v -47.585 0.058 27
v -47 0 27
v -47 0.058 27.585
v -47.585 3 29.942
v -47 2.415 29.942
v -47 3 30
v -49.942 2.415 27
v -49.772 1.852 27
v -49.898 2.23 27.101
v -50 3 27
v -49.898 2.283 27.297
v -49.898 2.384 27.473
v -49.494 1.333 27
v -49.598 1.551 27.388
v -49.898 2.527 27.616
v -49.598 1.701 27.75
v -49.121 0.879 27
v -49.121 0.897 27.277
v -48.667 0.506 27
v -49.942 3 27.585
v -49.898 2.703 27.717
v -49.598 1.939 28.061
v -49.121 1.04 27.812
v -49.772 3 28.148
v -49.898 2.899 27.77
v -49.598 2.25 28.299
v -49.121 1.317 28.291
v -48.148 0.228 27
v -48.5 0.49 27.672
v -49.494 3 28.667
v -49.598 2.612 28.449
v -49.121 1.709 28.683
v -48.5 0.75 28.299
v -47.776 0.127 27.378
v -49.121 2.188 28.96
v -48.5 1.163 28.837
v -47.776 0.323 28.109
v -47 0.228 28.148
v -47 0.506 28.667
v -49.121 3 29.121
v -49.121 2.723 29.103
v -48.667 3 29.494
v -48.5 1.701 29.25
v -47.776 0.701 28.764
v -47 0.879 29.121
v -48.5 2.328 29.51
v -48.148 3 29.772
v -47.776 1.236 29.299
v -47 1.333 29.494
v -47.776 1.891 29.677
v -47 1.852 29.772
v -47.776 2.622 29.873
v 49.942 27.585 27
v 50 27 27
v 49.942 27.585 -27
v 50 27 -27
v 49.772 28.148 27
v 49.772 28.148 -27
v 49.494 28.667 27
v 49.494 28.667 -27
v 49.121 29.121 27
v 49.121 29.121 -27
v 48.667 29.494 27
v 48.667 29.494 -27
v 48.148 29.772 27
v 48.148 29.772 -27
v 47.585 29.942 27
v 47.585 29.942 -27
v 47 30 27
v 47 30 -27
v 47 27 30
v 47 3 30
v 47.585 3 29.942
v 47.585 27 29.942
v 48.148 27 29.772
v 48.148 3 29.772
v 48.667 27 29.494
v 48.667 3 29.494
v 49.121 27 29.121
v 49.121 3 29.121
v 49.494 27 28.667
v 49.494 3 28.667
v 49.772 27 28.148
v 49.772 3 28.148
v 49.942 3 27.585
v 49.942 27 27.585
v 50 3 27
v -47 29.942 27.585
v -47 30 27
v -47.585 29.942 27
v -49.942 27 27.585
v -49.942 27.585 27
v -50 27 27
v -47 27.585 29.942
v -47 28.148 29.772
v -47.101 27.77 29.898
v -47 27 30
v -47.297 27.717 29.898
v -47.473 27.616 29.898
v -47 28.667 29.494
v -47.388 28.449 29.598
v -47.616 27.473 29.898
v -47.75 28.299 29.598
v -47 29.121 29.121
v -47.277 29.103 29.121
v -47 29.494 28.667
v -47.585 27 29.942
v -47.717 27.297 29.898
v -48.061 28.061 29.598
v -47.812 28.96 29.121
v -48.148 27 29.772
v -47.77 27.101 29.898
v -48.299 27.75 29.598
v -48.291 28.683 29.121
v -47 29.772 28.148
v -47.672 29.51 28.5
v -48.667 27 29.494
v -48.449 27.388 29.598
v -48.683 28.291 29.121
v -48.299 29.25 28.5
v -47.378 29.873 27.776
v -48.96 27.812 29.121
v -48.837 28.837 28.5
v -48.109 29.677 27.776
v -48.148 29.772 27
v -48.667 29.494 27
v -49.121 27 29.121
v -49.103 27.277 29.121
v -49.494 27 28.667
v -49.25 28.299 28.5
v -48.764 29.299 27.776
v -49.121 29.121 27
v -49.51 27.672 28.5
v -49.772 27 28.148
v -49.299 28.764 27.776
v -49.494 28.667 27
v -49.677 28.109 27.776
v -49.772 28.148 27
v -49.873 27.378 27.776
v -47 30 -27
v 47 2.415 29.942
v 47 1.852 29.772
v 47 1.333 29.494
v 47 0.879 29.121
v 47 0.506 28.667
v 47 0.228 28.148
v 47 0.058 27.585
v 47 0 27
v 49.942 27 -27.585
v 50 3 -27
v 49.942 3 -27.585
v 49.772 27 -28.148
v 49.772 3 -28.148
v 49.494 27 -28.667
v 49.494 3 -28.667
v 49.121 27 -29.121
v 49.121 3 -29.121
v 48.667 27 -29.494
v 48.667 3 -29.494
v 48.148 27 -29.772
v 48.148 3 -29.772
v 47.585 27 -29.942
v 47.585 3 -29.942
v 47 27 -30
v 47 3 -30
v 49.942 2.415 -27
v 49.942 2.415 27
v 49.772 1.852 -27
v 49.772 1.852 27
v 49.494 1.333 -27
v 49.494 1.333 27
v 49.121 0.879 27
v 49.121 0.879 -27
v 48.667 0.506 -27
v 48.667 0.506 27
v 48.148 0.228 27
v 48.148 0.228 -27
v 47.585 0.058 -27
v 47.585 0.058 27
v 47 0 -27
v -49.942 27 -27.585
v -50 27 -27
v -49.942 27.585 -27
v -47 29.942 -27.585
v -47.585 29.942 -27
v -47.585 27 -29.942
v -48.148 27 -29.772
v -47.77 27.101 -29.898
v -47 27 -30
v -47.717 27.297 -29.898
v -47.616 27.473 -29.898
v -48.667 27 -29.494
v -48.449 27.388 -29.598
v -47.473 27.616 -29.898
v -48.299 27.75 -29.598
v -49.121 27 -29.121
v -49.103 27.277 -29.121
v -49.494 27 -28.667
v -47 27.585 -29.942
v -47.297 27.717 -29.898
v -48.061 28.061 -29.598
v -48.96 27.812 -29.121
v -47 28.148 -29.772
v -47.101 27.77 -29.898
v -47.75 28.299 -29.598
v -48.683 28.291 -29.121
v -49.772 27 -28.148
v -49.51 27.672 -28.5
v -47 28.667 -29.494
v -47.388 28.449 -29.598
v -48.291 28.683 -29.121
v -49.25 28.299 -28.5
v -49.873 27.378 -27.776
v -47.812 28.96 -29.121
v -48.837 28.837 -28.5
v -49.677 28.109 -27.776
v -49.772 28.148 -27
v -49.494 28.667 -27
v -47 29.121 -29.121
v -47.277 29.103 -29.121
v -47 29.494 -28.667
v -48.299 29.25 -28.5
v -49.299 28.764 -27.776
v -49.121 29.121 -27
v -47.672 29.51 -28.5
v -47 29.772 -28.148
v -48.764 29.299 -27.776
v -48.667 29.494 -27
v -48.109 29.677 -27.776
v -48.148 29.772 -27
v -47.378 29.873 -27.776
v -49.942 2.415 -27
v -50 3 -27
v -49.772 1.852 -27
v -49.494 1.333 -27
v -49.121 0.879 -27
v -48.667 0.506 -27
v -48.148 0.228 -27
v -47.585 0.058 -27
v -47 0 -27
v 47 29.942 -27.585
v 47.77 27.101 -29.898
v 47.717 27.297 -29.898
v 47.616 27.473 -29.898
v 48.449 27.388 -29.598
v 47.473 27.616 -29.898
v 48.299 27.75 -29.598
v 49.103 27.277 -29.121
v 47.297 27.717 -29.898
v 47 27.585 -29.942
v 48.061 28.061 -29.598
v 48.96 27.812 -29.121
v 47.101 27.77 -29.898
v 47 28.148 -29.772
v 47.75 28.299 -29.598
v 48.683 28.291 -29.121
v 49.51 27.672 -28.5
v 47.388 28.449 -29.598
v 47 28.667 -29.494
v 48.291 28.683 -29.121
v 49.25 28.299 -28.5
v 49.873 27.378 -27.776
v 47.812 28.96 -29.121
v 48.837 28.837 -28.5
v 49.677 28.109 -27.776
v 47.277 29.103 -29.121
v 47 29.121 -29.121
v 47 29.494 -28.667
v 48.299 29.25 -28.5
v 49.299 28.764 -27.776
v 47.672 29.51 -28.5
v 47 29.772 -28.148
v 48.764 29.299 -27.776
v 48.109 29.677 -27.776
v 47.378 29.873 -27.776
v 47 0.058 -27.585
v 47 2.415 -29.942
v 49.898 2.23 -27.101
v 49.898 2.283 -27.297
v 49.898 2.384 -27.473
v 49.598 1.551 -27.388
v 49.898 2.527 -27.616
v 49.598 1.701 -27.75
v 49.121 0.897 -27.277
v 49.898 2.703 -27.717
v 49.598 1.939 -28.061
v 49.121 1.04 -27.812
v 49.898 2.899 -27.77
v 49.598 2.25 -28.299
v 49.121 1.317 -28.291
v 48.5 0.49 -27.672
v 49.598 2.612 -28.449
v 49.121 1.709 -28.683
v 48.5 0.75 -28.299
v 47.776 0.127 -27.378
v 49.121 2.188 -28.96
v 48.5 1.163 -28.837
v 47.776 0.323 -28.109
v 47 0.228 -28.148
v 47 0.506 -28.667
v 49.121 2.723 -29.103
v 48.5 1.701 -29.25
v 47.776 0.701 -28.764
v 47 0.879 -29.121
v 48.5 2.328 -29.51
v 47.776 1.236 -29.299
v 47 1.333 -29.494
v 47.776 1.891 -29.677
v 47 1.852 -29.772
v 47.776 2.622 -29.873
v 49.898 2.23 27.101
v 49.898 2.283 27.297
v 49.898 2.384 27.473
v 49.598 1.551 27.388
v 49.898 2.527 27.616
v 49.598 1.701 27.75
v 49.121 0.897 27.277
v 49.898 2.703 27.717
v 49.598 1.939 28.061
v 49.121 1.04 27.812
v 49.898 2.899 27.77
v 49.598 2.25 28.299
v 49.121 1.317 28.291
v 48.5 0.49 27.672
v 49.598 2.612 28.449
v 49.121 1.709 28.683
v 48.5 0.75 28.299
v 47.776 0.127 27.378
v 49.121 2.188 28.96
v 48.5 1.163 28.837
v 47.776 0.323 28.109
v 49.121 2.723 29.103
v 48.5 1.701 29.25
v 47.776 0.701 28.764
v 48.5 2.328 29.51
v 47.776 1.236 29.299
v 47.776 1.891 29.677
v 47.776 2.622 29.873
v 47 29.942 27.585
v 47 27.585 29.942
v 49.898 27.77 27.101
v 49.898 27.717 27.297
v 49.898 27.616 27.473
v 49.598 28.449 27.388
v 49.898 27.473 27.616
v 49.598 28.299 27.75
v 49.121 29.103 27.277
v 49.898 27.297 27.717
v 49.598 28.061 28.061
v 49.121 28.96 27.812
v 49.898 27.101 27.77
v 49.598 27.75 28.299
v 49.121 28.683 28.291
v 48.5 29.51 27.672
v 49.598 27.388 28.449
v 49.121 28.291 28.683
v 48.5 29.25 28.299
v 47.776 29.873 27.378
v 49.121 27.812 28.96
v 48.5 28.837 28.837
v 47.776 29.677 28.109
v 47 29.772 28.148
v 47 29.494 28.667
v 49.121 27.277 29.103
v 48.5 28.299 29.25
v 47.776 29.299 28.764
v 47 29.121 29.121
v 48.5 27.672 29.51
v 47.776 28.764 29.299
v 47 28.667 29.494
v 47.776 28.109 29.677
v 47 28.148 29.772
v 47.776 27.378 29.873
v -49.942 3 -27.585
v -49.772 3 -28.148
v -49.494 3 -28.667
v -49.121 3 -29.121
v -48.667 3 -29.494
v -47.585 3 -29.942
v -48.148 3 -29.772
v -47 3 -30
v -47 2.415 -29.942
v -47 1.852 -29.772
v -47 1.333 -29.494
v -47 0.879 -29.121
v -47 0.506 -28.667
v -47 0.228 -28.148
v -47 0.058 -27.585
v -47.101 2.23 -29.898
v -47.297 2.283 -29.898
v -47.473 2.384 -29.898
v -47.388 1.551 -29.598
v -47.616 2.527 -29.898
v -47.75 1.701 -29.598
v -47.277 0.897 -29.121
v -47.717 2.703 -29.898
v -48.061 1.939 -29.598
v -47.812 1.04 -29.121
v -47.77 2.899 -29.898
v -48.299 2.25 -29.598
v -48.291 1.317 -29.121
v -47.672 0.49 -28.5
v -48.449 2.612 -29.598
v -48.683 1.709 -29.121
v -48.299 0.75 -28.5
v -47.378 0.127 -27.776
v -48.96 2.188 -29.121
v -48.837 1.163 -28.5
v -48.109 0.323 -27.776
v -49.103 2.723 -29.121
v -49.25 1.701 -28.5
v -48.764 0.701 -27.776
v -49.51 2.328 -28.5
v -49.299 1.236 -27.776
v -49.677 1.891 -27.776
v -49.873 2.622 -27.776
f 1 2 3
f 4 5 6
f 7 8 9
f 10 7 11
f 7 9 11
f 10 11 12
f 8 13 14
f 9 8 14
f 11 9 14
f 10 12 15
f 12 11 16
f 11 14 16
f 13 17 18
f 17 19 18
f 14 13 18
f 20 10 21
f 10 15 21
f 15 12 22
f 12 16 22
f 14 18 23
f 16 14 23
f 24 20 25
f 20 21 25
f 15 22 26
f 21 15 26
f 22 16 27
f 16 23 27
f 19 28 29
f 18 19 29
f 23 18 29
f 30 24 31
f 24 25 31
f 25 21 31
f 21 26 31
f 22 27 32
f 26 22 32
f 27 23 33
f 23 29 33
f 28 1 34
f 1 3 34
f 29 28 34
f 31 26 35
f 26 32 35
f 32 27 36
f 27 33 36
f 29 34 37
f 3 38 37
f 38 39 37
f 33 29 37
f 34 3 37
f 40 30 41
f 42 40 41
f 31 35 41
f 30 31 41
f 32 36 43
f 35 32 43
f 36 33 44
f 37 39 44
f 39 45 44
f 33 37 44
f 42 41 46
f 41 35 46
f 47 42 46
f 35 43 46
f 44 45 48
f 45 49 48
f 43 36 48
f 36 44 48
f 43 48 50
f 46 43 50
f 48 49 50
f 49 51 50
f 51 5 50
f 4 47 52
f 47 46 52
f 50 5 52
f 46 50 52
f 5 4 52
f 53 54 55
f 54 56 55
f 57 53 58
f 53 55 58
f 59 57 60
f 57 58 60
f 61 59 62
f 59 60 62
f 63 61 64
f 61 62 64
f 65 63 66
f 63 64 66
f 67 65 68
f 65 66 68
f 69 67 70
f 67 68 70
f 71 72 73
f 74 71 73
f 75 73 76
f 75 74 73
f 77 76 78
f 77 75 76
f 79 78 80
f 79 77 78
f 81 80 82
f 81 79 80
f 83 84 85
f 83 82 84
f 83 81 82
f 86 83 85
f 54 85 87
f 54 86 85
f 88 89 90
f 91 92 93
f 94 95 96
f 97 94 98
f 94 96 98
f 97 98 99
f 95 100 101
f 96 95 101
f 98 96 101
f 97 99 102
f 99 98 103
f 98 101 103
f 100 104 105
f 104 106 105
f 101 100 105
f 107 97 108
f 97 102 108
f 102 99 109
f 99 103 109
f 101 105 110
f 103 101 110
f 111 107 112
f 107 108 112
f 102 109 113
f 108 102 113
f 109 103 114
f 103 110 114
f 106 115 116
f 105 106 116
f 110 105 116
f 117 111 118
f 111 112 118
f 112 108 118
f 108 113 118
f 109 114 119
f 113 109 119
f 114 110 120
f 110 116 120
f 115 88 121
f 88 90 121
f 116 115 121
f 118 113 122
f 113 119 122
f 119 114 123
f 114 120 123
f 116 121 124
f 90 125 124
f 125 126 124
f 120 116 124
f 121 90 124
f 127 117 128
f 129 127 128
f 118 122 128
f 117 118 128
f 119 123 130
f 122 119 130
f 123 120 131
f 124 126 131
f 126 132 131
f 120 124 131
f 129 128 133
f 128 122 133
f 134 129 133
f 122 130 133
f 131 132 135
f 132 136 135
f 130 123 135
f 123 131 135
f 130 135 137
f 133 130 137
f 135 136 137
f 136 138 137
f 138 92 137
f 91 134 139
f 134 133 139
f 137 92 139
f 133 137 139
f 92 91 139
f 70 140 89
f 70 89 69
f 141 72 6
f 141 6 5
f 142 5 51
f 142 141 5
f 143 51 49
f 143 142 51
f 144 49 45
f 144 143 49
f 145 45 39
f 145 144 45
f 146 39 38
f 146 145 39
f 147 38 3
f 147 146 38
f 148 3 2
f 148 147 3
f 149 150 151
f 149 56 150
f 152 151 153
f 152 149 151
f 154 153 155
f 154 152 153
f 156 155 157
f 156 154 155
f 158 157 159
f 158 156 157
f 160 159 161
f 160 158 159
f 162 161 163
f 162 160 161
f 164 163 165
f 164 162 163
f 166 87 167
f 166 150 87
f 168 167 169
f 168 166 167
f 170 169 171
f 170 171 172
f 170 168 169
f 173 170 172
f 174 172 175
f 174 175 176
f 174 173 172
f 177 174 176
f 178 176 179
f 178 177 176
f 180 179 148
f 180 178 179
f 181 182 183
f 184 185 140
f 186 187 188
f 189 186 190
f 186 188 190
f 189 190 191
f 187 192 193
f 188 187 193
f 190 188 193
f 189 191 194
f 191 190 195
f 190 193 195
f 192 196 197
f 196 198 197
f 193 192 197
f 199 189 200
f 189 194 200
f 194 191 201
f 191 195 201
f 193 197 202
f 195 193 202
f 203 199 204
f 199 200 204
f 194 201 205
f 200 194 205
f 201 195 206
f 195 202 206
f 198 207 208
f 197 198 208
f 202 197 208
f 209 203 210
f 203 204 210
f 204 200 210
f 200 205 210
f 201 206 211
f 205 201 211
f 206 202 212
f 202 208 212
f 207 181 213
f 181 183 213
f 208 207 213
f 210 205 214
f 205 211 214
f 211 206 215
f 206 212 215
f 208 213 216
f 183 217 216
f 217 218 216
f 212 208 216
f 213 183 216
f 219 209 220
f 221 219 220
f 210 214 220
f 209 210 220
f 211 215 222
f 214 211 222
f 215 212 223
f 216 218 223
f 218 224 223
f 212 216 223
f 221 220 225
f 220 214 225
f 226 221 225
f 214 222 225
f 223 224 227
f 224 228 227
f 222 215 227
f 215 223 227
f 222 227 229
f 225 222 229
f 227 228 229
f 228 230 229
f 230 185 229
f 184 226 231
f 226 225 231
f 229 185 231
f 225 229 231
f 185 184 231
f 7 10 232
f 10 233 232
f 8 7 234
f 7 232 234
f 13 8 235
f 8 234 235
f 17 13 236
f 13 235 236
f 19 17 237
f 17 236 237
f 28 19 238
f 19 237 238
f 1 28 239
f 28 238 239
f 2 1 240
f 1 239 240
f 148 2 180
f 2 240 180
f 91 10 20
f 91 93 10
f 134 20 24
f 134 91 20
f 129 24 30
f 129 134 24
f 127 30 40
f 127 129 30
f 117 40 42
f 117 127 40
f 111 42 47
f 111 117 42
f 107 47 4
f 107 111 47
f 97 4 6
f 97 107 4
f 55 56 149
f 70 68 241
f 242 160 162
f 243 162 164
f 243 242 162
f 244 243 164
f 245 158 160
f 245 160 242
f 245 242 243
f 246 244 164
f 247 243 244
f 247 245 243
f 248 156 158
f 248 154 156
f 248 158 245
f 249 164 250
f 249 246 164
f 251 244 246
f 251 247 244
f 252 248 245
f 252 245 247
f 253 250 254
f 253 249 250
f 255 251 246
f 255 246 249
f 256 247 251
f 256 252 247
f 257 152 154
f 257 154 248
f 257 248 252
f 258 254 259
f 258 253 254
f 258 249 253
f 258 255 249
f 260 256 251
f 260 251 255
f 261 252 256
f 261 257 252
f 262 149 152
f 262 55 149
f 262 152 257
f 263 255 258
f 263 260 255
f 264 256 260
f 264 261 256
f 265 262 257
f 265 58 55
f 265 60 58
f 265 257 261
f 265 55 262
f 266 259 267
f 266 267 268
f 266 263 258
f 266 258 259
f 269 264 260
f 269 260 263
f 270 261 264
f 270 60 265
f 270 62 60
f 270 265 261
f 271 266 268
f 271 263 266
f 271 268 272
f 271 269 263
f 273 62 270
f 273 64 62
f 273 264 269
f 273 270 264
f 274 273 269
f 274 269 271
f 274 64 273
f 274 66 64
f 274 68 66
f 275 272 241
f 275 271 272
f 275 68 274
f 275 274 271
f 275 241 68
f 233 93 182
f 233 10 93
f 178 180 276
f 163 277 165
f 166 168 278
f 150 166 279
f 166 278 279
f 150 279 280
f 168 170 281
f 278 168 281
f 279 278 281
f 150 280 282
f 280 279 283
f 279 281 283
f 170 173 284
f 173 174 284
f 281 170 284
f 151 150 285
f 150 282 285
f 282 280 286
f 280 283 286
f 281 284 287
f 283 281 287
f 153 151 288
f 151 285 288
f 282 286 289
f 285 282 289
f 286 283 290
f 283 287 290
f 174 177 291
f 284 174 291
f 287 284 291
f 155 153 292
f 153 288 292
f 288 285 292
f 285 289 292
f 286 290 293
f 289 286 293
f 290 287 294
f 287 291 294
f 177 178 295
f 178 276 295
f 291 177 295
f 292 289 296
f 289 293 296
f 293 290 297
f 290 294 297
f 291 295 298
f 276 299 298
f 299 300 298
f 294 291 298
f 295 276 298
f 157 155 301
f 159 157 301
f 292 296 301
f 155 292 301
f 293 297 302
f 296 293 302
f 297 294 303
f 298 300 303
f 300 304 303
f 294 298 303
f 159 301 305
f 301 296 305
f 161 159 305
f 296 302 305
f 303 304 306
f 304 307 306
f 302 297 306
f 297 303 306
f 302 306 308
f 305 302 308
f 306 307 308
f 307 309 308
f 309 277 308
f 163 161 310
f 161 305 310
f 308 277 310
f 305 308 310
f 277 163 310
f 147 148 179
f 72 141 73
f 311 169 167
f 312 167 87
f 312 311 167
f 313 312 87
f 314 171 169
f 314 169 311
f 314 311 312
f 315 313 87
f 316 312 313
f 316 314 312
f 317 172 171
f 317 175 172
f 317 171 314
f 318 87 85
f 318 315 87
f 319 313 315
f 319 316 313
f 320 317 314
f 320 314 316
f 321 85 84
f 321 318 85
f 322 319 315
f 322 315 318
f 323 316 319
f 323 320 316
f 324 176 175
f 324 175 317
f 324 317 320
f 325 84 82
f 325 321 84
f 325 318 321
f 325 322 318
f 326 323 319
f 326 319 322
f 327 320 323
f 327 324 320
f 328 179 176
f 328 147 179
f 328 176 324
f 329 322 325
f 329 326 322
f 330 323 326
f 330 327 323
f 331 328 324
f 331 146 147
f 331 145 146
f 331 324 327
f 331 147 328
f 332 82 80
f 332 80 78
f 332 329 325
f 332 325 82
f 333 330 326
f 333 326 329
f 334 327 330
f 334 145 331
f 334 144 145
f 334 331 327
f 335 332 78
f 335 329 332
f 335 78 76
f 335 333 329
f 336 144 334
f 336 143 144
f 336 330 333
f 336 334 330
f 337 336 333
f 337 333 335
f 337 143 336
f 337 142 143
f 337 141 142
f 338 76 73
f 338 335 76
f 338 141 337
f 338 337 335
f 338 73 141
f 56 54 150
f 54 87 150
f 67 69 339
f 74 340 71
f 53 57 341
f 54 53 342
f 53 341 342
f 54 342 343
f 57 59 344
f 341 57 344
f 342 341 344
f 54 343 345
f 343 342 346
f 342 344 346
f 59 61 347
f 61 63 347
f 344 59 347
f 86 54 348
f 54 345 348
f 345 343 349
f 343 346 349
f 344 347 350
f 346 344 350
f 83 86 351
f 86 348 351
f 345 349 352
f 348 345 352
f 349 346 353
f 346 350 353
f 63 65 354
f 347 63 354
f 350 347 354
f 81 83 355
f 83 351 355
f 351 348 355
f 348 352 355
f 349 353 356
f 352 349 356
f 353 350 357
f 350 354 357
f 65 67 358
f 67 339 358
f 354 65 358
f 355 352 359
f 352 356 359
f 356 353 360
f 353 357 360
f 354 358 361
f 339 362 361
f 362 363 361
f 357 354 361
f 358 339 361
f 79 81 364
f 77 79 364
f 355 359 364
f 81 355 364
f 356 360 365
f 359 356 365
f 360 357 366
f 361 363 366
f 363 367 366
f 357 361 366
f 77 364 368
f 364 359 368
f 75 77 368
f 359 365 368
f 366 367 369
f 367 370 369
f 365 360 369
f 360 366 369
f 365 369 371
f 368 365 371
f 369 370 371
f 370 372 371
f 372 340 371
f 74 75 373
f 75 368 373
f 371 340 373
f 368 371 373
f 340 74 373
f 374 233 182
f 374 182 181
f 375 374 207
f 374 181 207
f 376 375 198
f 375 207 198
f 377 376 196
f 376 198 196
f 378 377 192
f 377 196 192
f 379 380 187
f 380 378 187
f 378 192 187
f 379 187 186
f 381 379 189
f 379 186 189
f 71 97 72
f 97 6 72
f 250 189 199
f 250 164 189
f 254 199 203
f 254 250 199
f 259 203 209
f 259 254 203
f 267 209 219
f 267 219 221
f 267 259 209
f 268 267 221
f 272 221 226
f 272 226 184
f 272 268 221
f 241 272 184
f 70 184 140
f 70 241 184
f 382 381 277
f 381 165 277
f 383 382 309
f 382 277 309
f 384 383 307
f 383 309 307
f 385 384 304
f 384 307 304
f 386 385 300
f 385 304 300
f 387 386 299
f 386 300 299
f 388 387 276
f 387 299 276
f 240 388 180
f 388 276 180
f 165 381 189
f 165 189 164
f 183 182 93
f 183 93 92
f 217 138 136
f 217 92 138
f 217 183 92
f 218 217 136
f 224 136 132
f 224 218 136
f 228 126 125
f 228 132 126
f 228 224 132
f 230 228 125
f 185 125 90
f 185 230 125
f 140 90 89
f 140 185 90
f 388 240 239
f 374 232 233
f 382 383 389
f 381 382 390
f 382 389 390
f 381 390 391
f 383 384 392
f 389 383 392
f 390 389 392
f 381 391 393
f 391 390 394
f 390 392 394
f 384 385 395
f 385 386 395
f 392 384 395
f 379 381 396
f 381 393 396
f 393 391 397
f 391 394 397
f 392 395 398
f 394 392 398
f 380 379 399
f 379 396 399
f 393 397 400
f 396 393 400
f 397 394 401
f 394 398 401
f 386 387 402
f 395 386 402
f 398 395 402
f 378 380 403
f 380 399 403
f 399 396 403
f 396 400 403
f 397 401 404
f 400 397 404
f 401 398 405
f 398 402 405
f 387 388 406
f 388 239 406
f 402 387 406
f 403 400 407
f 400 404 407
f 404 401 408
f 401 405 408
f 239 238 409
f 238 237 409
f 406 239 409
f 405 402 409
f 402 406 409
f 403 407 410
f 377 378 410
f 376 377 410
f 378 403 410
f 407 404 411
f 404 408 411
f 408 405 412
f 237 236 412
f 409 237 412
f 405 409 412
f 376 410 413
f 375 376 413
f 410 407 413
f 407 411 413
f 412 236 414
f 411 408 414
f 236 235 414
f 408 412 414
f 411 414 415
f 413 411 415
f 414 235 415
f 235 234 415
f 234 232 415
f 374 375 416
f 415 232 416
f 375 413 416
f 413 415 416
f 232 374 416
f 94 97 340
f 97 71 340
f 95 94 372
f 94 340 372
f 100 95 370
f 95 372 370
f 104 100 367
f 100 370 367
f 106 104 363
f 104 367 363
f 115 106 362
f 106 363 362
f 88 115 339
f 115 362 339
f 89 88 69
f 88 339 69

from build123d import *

# Parameters (mm, degrees)
SKETCH_1_W      = 100
SKETCH_1_H      = 60
EXTRUDE_1_DEPTH = 30
FILLET_1_R      = 3


with BuildPart() as part:
    # Эскиз1 → Бобышка-Вытянуть1 (new body)
    with BuildSketch(Plane(origin=(0, 0, 0), x_dir=(1, 0, 0), z_dir=(0, 1, 0))):
        Rectangle(SKETCH_1_W, SKETCH_1_H)
    extrude(amount=EXTRUDE_1_DEPTH)

    # Скругление1
    fillet_1_edges = [part.edges().sort_by_distance(p)[0] for p in [
        (-50, 30, 0),
        (0, 30, 30),
        (50, 30, 0),
        (0, 0, 30),
        (-50, 0, 0),
        (0, 0, -30),
        (50, 0, 0),
        (50, 15, 30),
        (-50, 15, 30),
        (-50, 15, -30),
        (50, 15, -30),
        (0, 30, -30),
    ]]
    fillet(fillet_1_edges, radius=FILLET_1_R)


solid = part.part
